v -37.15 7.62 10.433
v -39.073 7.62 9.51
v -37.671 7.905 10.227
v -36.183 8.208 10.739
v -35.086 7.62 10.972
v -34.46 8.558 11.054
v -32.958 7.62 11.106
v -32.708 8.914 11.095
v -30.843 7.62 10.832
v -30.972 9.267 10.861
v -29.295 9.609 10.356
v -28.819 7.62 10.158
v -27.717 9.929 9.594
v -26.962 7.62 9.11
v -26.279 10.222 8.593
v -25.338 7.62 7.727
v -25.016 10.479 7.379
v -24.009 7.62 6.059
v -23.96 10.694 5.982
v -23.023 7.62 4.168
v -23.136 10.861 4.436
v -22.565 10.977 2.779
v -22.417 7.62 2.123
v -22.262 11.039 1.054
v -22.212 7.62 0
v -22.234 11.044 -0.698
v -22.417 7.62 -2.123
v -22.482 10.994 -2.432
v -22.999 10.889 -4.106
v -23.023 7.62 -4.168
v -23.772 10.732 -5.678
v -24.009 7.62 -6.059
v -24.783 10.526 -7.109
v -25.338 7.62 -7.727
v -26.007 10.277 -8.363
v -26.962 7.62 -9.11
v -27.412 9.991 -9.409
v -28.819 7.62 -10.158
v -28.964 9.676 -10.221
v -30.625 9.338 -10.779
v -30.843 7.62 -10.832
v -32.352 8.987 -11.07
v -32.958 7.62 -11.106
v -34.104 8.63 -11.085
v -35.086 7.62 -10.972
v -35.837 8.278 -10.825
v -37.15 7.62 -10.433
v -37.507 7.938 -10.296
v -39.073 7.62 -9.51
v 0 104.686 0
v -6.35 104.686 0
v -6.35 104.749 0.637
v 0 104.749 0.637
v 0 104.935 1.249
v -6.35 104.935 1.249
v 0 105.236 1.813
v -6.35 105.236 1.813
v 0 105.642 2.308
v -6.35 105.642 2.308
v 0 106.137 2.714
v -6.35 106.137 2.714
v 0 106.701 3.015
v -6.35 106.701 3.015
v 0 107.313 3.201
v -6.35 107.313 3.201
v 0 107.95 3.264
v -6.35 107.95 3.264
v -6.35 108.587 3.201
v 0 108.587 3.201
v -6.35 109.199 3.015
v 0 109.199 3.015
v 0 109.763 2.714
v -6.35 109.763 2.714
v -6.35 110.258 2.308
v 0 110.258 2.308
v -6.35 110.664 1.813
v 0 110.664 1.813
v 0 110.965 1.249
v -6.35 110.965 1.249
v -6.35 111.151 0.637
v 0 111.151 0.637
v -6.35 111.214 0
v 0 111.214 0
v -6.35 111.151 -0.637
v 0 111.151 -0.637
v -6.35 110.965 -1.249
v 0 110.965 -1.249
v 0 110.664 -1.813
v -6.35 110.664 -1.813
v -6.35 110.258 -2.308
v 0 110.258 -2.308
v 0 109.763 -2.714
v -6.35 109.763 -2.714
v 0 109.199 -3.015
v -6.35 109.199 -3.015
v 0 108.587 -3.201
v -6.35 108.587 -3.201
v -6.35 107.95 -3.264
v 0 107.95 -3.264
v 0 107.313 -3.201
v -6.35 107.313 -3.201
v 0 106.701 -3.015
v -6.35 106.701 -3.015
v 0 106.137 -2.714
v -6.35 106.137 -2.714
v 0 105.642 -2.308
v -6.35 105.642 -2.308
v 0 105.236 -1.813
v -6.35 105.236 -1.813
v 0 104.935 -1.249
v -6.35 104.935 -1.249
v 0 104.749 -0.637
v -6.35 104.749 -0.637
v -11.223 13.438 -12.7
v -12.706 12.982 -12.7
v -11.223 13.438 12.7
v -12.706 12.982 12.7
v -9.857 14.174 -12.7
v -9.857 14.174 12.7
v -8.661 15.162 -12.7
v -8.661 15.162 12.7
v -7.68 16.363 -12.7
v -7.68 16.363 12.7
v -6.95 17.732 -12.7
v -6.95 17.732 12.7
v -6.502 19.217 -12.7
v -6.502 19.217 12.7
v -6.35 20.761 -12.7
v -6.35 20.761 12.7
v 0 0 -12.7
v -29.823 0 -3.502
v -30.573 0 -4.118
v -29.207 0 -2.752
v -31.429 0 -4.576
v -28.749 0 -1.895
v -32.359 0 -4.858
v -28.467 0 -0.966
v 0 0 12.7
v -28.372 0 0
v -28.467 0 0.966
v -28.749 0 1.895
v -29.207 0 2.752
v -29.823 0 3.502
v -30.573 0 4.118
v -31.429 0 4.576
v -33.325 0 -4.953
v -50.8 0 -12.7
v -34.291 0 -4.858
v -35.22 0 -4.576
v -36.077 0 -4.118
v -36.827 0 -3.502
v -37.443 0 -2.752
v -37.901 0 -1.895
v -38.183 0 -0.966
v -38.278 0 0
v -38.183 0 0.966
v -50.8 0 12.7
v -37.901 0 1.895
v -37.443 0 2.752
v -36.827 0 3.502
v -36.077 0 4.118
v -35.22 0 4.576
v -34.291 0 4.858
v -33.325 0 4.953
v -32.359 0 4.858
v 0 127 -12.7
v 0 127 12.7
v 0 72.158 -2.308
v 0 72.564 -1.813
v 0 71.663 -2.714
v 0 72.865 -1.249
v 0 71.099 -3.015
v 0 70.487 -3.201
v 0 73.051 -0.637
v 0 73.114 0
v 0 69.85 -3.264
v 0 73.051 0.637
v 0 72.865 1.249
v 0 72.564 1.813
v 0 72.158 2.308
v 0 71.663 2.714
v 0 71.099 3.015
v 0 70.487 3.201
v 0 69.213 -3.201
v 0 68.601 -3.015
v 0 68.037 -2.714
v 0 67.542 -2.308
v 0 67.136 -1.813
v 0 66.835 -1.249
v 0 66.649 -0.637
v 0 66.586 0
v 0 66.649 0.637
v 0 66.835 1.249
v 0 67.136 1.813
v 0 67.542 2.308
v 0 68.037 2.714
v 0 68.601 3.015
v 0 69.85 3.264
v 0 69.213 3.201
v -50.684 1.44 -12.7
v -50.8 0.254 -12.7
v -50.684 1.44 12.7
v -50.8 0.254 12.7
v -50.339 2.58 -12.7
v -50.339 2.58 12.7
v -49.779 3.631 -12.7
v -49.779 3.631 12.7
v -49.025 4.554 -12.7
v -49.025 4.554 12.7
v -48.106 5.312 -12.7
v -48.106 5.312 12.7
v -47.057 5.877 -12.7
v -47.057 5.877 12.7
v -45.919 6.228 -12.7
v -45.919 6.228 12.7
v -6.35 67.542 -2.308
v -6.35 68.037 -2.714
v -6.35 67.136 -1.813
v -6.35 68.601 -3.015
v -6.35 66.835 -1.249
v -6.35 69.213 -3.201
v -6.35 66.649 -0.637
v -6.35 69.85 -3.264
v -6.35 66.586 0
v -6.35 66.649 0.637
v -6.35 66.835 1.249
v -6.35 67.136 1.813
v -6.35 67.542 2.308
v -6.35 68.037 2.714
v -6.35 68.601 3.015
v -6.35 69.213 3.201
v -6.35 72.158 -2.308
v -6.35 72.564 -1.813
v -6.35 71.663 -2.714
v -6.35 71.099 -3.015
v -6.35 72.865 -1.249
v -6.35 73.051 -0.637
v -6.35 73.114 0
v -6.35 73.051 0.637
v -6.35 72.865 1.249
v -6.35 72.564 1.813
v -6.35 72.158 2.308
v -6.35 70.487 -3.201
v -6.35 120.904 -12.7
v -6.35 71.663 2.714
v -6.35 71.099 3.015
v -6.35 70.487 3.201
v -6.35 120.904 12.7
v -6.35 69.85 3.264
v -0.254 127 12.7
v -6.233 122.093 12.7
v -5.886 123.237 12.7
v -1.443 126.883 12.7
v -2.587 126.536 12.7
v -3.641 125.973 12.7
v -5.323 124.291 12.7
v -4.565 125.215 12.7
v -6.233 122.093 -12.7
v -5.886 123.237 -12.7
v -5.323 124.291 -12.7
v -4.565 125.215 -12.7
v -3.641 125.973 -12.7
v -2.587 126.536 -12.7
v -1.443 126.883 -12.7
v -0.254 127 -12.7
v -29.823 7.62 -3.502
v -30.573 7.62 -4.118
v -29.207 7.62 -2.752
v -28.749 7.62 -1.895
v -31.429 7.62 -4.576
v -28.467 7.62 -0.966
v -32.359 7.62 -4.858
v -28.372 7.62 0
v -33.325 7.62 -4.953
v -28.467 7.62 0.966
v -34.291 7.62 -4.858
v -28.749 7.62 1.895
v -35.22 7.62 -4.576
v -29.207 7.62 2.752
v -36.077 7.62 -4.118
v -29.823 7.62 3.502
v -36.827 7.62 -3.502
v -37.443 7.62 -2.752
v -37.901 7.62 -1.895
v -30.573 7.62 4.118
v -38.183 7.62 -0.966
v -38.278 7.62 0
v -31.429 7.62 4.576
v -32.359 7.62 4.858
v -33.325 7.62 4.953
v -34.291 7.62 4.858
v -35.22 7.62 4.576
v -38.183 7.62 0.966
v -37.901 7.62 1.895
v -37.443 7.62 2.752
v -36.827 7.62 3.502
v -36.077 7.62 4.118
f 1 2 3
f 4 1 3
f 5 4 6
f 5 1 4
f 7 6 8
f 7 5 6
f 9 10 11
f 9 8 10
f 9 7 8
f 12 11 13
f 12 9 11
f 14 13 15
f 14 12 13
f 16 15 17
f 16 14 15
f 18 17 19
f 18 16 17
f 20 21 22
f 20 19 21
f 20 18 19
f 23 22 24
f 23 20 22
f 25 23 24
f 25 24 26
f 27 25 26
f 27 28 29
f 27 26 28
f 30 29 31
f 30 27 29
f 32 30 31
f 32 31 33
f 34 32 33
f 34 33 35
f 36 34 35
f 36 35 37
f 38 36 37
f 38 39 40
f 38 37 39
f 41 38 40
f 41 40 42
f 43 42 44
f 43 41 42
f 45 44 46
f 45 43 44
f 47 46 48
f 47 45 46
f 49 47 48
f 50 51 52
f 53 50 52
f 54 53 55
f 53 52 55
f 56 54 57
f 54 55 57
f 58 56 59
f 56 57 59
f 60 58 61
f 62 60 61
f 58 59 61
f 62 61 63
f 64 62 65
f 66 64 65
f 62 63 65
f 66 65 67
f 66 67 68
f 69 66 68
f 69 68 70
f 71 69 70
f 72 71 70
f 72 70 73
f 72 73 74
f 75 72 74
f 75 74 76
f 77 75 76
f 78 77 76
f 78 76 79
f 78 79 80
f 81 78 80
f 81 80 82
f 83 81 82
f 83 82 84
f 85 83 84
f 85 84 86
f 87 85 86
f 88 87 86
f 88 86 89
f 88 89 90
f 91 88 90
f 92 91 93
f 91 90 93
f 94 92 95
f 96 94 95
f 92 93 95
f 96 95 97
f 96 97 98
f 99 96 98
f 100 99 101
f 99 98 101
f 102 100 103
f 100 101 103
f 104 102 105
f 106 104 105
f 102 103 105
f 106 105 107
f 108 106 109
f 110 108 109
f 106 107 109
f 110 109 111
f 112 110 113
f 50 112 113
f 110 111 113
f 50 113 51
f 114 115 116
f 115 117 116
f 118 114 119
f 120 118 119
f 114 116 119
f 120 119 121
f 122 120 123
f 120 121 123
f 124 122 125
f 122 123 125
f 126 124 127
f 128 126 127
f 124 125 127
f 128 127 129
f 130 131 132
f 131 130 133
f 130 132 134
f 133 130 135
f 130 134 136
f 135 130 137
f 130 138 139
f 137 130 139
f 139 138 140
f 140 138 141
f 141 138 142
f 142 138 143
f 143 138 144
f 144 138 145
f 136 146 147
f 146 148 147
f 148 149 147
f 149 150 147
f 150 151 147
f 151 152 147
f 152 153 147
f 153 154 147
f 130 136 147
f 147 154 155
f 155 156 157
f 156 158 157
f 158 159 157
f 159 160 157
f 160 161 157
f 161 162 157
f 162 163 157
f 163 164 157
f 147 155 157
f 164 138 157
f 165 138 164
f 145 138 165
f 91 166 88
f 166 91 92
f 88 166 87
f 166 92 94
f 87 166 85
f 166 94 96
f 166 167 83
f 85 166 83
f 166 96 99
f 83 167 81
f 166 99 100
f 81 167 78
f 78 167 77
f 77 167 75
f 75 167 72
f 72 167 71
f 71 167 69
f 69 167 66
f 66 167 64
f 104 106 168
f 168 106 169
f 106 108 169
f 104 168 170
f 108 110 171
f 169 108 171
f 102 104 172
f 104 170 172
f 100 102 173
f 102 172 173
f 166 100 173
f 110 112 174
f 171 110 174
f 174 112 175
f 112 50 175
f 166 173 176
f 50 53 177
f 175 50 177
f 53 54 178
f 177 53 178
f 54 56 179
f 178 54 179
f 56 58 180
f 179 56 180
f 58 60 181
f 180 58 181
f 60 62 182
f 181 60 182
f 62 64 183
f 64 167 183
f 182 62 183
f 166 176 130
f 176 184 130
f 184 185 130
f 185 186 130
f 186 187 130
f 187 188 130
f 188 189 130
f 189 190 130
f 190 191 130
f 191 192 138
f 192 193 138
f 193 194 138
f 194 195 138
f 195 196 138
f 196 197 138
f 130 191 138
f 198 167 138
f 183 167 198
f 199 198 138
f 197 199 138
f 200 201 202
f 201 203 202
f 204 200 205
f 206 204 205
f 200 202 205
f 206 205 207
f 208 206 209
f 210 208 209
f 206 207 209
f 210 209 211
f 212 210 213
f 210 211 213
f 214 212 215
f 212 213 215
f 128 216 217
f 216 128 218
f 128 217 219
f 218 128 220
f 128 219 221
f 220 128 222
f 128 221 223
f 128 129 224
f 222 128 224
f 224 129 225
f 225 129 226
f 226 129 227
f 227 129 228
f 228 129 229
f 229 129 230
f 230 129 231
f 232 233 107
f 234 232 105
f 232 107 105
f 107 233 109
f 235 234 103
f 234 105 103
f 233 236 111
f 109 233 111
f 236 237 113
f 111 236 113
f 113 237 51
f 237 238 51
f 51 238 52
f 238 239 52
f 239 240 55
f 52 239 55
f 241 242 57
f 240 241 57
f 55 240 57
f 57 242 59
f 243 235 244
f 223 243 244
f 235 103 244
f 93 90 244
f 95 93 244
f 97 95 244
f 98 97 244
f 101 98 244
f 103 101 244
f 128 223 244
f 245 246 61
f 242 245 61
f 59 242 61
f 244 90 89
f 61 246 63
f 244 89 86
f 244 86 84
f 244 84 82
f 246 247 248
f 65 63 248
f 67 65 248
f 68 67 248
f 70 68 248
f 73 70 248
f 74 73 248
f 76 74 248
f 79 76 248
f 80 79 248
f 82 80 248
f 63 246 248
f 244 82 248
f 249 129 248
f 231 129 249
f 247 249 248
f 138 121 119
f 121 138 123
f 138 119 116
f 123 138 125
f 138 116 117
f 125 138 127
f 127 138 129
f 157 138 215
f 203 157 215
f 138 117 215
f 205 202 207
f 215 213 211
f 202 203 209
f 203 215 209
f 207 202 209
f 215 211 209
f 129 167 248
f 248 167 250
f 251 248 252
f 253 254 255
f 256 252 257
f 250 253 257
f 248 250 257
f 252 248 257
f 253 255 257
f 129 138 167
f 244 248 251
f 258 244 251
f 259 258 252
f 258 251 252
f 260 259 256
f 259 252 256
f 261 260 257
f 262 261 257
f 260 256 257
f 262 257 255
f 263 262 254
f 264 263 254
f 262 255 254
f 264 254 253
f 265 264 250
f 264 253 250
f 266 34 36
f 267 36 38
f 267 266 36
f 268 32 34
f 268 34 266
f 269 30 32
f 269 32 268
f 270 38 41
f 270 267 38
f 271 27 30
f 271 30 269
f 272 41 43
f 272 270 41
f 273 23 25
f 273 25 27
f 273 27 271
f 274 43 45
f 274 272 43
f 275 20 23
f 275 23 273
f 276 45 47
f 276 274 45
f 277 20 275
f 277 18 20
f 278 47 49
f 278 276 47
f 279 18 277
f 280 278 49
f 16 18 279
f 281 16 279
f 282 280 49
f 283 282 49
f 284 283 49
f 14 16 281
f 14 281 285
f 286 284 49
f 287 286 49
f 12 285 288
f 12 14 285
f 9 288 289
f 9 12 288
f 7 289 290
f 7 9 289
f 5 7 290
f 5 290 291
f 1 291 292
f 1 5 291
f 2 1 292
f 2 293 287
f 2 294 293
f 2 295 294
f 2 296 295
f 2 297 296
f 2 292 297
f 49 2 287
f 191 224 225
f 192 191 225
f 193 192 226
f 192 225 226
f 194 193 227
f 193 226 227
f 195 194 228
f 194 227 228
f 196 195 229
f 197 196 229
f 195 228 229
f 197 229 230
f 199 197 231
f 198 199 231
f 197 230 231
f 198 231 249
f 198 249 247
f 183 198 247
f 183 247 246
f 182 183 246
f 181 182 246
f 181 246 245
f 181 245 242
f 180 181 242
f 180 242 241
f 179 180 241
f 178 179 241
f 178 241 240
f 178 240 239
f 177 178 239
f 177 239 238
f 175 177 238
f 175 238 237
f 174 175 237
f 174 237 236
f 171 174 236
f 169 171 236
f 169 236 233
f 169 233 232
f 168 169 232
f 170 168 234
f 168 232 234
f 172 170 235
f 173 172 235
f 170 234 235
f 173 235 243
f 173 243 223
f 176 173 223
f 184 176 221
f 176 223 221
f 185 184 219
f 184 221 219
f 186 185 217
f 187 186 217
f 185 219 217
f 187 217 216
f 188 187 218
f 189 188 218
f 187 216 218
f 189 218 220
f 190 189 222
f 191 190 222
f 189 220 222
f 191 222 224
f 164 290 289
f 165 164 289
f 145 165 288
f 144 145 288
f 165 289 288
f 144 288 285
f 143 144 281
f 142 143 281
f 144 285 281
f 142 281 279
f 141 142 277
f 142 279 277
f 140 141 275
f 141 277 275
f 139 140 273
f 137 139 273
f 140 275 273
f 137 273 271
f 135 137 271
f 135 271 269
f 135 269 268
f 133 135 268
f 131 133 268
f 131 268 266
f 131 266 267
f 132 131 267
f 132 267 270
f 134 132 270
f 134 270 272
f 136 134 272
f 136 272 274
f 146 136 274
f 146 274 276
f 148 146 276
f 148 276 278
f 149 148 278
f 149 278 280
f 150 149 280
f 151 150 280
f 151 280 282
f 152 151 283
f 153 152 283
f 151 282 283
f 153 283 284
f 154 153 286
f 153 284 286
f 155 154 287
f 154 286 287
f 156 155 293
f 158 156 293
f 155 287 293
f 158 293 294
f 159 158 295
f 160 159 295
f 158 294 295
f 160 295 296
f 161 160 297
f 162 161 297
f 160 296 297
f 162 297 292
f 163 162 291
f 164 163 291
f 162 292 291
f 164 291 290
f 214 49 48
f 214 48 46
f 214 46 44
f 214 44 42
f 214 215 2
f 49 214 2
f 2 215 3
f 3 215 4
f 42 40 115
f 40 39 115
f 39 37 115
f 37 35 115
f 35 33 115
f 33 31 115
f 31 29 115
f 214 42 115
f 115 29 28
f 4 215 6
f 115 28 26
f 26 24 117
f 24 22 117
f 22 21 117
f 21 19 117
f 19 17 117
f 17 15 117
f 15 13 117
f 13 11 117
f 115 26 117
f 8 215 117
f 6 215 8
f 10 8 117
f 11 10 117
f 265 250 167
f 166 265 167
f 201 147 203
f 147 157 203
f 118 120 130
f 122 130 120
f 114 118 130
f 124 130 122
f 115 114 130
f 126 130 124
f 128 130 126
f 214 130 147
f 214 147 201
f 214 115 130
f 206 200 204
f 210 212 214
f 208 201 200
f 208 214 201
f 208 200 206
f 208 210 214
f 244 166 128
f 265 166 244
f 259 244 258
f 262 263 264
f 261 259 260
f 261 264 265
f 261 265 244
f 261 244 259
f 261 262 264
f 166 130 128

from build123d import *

# Parameters (mm, degrees)
EXTRUDE1_DEPTH     = 12.7
SKETCH5_R          = 3.2639
CUT_EXTRUDE1_DEPTH = 136.152108752
SKETCH6_R          = 4.953
CUT_EXTRUDE2_DEPTH = 131.359174591
SKETCH7_R          = 11.1125
CUT_EXTRUDE3_DEPTH = 131.359174591


with BuildPart() as part:
    # Sketch1 → Extrude1 (new, symmetric)
    with BuildSketch(Plane.XY):
        with BuildLine():
            Line((0, 127), (0, 0))
            Line((0, 0), (-50.8, 0))
            Line((-50.8, 0), (-50.8, 0.254))
            ThreePointArc((-50.8, 0.254), (-49.424543317, 4.111160457), (-45.918869163, 6.227718182))
            Line((-45.918869163, 6.227718182), (-12.70563911, 12.982259955))
            ThreePointArc((-12.70563911, 12.982259955), (-8.140959222, 15.738194493), (-6.35, 20.760538838))
            Line((-6.35, 20.760538838), (-6.35, 120.904))
            ThreePointArc((-6.35, 120.904), (-4.564522938, 125.214522938), (-0.254, 127))
            Line((-0.254, 127), (0, 127))
        make_face()
    extrude(amount=EXTRUDE1_DEPTH, both=True)

    # Sketch5 → Cut-Extrude1 (cut, through all)
    with BuildSketch(Plane.ZY.offset(6.35)):
        with Locations(Location((0, 69.85, 0), (0, 0, 270))):
            Circle(SKETCH5_R)
        with Locations(Location((0, 107.95, 0), (0, 0, 270))):
            Circle(SKETCH5_R)
    extrude(amount=-CUT_EXTRUDE1_DEPTH, mode=Mode.SUBTRACT)

    # Sketch6 → Cut-Extrude2 (cut, through all)
    with BuildSketch(Plane(origin=(0, 7.62, 0), x_dir=(-1, 0, 0), z_dir=(0, 1, 0))):
        with Locations(Location((33.3248, 0, 0), (0, 0, 90))):
            Circle(SKETCH6_R)
    extrude(amount=-CUT_EXTRUDE2_DEPTH, mode=Mode.SUBTRACT)

    # Sketch7 → Cut-Extrude3 (cut, through all)
    with BuildSketch(Plane(origin=(0, 7.62, 0), x_dir=(-1, 0, 0), z_dir=(0, 1, 0))):
        with Locations((33.3248, 0)):
            Circle(SKETCH7_R)
    extrude(amount=CUT_EXTRUDE3_DEPTH, mode=Mode.SUBTRACT)


solid = part.part
